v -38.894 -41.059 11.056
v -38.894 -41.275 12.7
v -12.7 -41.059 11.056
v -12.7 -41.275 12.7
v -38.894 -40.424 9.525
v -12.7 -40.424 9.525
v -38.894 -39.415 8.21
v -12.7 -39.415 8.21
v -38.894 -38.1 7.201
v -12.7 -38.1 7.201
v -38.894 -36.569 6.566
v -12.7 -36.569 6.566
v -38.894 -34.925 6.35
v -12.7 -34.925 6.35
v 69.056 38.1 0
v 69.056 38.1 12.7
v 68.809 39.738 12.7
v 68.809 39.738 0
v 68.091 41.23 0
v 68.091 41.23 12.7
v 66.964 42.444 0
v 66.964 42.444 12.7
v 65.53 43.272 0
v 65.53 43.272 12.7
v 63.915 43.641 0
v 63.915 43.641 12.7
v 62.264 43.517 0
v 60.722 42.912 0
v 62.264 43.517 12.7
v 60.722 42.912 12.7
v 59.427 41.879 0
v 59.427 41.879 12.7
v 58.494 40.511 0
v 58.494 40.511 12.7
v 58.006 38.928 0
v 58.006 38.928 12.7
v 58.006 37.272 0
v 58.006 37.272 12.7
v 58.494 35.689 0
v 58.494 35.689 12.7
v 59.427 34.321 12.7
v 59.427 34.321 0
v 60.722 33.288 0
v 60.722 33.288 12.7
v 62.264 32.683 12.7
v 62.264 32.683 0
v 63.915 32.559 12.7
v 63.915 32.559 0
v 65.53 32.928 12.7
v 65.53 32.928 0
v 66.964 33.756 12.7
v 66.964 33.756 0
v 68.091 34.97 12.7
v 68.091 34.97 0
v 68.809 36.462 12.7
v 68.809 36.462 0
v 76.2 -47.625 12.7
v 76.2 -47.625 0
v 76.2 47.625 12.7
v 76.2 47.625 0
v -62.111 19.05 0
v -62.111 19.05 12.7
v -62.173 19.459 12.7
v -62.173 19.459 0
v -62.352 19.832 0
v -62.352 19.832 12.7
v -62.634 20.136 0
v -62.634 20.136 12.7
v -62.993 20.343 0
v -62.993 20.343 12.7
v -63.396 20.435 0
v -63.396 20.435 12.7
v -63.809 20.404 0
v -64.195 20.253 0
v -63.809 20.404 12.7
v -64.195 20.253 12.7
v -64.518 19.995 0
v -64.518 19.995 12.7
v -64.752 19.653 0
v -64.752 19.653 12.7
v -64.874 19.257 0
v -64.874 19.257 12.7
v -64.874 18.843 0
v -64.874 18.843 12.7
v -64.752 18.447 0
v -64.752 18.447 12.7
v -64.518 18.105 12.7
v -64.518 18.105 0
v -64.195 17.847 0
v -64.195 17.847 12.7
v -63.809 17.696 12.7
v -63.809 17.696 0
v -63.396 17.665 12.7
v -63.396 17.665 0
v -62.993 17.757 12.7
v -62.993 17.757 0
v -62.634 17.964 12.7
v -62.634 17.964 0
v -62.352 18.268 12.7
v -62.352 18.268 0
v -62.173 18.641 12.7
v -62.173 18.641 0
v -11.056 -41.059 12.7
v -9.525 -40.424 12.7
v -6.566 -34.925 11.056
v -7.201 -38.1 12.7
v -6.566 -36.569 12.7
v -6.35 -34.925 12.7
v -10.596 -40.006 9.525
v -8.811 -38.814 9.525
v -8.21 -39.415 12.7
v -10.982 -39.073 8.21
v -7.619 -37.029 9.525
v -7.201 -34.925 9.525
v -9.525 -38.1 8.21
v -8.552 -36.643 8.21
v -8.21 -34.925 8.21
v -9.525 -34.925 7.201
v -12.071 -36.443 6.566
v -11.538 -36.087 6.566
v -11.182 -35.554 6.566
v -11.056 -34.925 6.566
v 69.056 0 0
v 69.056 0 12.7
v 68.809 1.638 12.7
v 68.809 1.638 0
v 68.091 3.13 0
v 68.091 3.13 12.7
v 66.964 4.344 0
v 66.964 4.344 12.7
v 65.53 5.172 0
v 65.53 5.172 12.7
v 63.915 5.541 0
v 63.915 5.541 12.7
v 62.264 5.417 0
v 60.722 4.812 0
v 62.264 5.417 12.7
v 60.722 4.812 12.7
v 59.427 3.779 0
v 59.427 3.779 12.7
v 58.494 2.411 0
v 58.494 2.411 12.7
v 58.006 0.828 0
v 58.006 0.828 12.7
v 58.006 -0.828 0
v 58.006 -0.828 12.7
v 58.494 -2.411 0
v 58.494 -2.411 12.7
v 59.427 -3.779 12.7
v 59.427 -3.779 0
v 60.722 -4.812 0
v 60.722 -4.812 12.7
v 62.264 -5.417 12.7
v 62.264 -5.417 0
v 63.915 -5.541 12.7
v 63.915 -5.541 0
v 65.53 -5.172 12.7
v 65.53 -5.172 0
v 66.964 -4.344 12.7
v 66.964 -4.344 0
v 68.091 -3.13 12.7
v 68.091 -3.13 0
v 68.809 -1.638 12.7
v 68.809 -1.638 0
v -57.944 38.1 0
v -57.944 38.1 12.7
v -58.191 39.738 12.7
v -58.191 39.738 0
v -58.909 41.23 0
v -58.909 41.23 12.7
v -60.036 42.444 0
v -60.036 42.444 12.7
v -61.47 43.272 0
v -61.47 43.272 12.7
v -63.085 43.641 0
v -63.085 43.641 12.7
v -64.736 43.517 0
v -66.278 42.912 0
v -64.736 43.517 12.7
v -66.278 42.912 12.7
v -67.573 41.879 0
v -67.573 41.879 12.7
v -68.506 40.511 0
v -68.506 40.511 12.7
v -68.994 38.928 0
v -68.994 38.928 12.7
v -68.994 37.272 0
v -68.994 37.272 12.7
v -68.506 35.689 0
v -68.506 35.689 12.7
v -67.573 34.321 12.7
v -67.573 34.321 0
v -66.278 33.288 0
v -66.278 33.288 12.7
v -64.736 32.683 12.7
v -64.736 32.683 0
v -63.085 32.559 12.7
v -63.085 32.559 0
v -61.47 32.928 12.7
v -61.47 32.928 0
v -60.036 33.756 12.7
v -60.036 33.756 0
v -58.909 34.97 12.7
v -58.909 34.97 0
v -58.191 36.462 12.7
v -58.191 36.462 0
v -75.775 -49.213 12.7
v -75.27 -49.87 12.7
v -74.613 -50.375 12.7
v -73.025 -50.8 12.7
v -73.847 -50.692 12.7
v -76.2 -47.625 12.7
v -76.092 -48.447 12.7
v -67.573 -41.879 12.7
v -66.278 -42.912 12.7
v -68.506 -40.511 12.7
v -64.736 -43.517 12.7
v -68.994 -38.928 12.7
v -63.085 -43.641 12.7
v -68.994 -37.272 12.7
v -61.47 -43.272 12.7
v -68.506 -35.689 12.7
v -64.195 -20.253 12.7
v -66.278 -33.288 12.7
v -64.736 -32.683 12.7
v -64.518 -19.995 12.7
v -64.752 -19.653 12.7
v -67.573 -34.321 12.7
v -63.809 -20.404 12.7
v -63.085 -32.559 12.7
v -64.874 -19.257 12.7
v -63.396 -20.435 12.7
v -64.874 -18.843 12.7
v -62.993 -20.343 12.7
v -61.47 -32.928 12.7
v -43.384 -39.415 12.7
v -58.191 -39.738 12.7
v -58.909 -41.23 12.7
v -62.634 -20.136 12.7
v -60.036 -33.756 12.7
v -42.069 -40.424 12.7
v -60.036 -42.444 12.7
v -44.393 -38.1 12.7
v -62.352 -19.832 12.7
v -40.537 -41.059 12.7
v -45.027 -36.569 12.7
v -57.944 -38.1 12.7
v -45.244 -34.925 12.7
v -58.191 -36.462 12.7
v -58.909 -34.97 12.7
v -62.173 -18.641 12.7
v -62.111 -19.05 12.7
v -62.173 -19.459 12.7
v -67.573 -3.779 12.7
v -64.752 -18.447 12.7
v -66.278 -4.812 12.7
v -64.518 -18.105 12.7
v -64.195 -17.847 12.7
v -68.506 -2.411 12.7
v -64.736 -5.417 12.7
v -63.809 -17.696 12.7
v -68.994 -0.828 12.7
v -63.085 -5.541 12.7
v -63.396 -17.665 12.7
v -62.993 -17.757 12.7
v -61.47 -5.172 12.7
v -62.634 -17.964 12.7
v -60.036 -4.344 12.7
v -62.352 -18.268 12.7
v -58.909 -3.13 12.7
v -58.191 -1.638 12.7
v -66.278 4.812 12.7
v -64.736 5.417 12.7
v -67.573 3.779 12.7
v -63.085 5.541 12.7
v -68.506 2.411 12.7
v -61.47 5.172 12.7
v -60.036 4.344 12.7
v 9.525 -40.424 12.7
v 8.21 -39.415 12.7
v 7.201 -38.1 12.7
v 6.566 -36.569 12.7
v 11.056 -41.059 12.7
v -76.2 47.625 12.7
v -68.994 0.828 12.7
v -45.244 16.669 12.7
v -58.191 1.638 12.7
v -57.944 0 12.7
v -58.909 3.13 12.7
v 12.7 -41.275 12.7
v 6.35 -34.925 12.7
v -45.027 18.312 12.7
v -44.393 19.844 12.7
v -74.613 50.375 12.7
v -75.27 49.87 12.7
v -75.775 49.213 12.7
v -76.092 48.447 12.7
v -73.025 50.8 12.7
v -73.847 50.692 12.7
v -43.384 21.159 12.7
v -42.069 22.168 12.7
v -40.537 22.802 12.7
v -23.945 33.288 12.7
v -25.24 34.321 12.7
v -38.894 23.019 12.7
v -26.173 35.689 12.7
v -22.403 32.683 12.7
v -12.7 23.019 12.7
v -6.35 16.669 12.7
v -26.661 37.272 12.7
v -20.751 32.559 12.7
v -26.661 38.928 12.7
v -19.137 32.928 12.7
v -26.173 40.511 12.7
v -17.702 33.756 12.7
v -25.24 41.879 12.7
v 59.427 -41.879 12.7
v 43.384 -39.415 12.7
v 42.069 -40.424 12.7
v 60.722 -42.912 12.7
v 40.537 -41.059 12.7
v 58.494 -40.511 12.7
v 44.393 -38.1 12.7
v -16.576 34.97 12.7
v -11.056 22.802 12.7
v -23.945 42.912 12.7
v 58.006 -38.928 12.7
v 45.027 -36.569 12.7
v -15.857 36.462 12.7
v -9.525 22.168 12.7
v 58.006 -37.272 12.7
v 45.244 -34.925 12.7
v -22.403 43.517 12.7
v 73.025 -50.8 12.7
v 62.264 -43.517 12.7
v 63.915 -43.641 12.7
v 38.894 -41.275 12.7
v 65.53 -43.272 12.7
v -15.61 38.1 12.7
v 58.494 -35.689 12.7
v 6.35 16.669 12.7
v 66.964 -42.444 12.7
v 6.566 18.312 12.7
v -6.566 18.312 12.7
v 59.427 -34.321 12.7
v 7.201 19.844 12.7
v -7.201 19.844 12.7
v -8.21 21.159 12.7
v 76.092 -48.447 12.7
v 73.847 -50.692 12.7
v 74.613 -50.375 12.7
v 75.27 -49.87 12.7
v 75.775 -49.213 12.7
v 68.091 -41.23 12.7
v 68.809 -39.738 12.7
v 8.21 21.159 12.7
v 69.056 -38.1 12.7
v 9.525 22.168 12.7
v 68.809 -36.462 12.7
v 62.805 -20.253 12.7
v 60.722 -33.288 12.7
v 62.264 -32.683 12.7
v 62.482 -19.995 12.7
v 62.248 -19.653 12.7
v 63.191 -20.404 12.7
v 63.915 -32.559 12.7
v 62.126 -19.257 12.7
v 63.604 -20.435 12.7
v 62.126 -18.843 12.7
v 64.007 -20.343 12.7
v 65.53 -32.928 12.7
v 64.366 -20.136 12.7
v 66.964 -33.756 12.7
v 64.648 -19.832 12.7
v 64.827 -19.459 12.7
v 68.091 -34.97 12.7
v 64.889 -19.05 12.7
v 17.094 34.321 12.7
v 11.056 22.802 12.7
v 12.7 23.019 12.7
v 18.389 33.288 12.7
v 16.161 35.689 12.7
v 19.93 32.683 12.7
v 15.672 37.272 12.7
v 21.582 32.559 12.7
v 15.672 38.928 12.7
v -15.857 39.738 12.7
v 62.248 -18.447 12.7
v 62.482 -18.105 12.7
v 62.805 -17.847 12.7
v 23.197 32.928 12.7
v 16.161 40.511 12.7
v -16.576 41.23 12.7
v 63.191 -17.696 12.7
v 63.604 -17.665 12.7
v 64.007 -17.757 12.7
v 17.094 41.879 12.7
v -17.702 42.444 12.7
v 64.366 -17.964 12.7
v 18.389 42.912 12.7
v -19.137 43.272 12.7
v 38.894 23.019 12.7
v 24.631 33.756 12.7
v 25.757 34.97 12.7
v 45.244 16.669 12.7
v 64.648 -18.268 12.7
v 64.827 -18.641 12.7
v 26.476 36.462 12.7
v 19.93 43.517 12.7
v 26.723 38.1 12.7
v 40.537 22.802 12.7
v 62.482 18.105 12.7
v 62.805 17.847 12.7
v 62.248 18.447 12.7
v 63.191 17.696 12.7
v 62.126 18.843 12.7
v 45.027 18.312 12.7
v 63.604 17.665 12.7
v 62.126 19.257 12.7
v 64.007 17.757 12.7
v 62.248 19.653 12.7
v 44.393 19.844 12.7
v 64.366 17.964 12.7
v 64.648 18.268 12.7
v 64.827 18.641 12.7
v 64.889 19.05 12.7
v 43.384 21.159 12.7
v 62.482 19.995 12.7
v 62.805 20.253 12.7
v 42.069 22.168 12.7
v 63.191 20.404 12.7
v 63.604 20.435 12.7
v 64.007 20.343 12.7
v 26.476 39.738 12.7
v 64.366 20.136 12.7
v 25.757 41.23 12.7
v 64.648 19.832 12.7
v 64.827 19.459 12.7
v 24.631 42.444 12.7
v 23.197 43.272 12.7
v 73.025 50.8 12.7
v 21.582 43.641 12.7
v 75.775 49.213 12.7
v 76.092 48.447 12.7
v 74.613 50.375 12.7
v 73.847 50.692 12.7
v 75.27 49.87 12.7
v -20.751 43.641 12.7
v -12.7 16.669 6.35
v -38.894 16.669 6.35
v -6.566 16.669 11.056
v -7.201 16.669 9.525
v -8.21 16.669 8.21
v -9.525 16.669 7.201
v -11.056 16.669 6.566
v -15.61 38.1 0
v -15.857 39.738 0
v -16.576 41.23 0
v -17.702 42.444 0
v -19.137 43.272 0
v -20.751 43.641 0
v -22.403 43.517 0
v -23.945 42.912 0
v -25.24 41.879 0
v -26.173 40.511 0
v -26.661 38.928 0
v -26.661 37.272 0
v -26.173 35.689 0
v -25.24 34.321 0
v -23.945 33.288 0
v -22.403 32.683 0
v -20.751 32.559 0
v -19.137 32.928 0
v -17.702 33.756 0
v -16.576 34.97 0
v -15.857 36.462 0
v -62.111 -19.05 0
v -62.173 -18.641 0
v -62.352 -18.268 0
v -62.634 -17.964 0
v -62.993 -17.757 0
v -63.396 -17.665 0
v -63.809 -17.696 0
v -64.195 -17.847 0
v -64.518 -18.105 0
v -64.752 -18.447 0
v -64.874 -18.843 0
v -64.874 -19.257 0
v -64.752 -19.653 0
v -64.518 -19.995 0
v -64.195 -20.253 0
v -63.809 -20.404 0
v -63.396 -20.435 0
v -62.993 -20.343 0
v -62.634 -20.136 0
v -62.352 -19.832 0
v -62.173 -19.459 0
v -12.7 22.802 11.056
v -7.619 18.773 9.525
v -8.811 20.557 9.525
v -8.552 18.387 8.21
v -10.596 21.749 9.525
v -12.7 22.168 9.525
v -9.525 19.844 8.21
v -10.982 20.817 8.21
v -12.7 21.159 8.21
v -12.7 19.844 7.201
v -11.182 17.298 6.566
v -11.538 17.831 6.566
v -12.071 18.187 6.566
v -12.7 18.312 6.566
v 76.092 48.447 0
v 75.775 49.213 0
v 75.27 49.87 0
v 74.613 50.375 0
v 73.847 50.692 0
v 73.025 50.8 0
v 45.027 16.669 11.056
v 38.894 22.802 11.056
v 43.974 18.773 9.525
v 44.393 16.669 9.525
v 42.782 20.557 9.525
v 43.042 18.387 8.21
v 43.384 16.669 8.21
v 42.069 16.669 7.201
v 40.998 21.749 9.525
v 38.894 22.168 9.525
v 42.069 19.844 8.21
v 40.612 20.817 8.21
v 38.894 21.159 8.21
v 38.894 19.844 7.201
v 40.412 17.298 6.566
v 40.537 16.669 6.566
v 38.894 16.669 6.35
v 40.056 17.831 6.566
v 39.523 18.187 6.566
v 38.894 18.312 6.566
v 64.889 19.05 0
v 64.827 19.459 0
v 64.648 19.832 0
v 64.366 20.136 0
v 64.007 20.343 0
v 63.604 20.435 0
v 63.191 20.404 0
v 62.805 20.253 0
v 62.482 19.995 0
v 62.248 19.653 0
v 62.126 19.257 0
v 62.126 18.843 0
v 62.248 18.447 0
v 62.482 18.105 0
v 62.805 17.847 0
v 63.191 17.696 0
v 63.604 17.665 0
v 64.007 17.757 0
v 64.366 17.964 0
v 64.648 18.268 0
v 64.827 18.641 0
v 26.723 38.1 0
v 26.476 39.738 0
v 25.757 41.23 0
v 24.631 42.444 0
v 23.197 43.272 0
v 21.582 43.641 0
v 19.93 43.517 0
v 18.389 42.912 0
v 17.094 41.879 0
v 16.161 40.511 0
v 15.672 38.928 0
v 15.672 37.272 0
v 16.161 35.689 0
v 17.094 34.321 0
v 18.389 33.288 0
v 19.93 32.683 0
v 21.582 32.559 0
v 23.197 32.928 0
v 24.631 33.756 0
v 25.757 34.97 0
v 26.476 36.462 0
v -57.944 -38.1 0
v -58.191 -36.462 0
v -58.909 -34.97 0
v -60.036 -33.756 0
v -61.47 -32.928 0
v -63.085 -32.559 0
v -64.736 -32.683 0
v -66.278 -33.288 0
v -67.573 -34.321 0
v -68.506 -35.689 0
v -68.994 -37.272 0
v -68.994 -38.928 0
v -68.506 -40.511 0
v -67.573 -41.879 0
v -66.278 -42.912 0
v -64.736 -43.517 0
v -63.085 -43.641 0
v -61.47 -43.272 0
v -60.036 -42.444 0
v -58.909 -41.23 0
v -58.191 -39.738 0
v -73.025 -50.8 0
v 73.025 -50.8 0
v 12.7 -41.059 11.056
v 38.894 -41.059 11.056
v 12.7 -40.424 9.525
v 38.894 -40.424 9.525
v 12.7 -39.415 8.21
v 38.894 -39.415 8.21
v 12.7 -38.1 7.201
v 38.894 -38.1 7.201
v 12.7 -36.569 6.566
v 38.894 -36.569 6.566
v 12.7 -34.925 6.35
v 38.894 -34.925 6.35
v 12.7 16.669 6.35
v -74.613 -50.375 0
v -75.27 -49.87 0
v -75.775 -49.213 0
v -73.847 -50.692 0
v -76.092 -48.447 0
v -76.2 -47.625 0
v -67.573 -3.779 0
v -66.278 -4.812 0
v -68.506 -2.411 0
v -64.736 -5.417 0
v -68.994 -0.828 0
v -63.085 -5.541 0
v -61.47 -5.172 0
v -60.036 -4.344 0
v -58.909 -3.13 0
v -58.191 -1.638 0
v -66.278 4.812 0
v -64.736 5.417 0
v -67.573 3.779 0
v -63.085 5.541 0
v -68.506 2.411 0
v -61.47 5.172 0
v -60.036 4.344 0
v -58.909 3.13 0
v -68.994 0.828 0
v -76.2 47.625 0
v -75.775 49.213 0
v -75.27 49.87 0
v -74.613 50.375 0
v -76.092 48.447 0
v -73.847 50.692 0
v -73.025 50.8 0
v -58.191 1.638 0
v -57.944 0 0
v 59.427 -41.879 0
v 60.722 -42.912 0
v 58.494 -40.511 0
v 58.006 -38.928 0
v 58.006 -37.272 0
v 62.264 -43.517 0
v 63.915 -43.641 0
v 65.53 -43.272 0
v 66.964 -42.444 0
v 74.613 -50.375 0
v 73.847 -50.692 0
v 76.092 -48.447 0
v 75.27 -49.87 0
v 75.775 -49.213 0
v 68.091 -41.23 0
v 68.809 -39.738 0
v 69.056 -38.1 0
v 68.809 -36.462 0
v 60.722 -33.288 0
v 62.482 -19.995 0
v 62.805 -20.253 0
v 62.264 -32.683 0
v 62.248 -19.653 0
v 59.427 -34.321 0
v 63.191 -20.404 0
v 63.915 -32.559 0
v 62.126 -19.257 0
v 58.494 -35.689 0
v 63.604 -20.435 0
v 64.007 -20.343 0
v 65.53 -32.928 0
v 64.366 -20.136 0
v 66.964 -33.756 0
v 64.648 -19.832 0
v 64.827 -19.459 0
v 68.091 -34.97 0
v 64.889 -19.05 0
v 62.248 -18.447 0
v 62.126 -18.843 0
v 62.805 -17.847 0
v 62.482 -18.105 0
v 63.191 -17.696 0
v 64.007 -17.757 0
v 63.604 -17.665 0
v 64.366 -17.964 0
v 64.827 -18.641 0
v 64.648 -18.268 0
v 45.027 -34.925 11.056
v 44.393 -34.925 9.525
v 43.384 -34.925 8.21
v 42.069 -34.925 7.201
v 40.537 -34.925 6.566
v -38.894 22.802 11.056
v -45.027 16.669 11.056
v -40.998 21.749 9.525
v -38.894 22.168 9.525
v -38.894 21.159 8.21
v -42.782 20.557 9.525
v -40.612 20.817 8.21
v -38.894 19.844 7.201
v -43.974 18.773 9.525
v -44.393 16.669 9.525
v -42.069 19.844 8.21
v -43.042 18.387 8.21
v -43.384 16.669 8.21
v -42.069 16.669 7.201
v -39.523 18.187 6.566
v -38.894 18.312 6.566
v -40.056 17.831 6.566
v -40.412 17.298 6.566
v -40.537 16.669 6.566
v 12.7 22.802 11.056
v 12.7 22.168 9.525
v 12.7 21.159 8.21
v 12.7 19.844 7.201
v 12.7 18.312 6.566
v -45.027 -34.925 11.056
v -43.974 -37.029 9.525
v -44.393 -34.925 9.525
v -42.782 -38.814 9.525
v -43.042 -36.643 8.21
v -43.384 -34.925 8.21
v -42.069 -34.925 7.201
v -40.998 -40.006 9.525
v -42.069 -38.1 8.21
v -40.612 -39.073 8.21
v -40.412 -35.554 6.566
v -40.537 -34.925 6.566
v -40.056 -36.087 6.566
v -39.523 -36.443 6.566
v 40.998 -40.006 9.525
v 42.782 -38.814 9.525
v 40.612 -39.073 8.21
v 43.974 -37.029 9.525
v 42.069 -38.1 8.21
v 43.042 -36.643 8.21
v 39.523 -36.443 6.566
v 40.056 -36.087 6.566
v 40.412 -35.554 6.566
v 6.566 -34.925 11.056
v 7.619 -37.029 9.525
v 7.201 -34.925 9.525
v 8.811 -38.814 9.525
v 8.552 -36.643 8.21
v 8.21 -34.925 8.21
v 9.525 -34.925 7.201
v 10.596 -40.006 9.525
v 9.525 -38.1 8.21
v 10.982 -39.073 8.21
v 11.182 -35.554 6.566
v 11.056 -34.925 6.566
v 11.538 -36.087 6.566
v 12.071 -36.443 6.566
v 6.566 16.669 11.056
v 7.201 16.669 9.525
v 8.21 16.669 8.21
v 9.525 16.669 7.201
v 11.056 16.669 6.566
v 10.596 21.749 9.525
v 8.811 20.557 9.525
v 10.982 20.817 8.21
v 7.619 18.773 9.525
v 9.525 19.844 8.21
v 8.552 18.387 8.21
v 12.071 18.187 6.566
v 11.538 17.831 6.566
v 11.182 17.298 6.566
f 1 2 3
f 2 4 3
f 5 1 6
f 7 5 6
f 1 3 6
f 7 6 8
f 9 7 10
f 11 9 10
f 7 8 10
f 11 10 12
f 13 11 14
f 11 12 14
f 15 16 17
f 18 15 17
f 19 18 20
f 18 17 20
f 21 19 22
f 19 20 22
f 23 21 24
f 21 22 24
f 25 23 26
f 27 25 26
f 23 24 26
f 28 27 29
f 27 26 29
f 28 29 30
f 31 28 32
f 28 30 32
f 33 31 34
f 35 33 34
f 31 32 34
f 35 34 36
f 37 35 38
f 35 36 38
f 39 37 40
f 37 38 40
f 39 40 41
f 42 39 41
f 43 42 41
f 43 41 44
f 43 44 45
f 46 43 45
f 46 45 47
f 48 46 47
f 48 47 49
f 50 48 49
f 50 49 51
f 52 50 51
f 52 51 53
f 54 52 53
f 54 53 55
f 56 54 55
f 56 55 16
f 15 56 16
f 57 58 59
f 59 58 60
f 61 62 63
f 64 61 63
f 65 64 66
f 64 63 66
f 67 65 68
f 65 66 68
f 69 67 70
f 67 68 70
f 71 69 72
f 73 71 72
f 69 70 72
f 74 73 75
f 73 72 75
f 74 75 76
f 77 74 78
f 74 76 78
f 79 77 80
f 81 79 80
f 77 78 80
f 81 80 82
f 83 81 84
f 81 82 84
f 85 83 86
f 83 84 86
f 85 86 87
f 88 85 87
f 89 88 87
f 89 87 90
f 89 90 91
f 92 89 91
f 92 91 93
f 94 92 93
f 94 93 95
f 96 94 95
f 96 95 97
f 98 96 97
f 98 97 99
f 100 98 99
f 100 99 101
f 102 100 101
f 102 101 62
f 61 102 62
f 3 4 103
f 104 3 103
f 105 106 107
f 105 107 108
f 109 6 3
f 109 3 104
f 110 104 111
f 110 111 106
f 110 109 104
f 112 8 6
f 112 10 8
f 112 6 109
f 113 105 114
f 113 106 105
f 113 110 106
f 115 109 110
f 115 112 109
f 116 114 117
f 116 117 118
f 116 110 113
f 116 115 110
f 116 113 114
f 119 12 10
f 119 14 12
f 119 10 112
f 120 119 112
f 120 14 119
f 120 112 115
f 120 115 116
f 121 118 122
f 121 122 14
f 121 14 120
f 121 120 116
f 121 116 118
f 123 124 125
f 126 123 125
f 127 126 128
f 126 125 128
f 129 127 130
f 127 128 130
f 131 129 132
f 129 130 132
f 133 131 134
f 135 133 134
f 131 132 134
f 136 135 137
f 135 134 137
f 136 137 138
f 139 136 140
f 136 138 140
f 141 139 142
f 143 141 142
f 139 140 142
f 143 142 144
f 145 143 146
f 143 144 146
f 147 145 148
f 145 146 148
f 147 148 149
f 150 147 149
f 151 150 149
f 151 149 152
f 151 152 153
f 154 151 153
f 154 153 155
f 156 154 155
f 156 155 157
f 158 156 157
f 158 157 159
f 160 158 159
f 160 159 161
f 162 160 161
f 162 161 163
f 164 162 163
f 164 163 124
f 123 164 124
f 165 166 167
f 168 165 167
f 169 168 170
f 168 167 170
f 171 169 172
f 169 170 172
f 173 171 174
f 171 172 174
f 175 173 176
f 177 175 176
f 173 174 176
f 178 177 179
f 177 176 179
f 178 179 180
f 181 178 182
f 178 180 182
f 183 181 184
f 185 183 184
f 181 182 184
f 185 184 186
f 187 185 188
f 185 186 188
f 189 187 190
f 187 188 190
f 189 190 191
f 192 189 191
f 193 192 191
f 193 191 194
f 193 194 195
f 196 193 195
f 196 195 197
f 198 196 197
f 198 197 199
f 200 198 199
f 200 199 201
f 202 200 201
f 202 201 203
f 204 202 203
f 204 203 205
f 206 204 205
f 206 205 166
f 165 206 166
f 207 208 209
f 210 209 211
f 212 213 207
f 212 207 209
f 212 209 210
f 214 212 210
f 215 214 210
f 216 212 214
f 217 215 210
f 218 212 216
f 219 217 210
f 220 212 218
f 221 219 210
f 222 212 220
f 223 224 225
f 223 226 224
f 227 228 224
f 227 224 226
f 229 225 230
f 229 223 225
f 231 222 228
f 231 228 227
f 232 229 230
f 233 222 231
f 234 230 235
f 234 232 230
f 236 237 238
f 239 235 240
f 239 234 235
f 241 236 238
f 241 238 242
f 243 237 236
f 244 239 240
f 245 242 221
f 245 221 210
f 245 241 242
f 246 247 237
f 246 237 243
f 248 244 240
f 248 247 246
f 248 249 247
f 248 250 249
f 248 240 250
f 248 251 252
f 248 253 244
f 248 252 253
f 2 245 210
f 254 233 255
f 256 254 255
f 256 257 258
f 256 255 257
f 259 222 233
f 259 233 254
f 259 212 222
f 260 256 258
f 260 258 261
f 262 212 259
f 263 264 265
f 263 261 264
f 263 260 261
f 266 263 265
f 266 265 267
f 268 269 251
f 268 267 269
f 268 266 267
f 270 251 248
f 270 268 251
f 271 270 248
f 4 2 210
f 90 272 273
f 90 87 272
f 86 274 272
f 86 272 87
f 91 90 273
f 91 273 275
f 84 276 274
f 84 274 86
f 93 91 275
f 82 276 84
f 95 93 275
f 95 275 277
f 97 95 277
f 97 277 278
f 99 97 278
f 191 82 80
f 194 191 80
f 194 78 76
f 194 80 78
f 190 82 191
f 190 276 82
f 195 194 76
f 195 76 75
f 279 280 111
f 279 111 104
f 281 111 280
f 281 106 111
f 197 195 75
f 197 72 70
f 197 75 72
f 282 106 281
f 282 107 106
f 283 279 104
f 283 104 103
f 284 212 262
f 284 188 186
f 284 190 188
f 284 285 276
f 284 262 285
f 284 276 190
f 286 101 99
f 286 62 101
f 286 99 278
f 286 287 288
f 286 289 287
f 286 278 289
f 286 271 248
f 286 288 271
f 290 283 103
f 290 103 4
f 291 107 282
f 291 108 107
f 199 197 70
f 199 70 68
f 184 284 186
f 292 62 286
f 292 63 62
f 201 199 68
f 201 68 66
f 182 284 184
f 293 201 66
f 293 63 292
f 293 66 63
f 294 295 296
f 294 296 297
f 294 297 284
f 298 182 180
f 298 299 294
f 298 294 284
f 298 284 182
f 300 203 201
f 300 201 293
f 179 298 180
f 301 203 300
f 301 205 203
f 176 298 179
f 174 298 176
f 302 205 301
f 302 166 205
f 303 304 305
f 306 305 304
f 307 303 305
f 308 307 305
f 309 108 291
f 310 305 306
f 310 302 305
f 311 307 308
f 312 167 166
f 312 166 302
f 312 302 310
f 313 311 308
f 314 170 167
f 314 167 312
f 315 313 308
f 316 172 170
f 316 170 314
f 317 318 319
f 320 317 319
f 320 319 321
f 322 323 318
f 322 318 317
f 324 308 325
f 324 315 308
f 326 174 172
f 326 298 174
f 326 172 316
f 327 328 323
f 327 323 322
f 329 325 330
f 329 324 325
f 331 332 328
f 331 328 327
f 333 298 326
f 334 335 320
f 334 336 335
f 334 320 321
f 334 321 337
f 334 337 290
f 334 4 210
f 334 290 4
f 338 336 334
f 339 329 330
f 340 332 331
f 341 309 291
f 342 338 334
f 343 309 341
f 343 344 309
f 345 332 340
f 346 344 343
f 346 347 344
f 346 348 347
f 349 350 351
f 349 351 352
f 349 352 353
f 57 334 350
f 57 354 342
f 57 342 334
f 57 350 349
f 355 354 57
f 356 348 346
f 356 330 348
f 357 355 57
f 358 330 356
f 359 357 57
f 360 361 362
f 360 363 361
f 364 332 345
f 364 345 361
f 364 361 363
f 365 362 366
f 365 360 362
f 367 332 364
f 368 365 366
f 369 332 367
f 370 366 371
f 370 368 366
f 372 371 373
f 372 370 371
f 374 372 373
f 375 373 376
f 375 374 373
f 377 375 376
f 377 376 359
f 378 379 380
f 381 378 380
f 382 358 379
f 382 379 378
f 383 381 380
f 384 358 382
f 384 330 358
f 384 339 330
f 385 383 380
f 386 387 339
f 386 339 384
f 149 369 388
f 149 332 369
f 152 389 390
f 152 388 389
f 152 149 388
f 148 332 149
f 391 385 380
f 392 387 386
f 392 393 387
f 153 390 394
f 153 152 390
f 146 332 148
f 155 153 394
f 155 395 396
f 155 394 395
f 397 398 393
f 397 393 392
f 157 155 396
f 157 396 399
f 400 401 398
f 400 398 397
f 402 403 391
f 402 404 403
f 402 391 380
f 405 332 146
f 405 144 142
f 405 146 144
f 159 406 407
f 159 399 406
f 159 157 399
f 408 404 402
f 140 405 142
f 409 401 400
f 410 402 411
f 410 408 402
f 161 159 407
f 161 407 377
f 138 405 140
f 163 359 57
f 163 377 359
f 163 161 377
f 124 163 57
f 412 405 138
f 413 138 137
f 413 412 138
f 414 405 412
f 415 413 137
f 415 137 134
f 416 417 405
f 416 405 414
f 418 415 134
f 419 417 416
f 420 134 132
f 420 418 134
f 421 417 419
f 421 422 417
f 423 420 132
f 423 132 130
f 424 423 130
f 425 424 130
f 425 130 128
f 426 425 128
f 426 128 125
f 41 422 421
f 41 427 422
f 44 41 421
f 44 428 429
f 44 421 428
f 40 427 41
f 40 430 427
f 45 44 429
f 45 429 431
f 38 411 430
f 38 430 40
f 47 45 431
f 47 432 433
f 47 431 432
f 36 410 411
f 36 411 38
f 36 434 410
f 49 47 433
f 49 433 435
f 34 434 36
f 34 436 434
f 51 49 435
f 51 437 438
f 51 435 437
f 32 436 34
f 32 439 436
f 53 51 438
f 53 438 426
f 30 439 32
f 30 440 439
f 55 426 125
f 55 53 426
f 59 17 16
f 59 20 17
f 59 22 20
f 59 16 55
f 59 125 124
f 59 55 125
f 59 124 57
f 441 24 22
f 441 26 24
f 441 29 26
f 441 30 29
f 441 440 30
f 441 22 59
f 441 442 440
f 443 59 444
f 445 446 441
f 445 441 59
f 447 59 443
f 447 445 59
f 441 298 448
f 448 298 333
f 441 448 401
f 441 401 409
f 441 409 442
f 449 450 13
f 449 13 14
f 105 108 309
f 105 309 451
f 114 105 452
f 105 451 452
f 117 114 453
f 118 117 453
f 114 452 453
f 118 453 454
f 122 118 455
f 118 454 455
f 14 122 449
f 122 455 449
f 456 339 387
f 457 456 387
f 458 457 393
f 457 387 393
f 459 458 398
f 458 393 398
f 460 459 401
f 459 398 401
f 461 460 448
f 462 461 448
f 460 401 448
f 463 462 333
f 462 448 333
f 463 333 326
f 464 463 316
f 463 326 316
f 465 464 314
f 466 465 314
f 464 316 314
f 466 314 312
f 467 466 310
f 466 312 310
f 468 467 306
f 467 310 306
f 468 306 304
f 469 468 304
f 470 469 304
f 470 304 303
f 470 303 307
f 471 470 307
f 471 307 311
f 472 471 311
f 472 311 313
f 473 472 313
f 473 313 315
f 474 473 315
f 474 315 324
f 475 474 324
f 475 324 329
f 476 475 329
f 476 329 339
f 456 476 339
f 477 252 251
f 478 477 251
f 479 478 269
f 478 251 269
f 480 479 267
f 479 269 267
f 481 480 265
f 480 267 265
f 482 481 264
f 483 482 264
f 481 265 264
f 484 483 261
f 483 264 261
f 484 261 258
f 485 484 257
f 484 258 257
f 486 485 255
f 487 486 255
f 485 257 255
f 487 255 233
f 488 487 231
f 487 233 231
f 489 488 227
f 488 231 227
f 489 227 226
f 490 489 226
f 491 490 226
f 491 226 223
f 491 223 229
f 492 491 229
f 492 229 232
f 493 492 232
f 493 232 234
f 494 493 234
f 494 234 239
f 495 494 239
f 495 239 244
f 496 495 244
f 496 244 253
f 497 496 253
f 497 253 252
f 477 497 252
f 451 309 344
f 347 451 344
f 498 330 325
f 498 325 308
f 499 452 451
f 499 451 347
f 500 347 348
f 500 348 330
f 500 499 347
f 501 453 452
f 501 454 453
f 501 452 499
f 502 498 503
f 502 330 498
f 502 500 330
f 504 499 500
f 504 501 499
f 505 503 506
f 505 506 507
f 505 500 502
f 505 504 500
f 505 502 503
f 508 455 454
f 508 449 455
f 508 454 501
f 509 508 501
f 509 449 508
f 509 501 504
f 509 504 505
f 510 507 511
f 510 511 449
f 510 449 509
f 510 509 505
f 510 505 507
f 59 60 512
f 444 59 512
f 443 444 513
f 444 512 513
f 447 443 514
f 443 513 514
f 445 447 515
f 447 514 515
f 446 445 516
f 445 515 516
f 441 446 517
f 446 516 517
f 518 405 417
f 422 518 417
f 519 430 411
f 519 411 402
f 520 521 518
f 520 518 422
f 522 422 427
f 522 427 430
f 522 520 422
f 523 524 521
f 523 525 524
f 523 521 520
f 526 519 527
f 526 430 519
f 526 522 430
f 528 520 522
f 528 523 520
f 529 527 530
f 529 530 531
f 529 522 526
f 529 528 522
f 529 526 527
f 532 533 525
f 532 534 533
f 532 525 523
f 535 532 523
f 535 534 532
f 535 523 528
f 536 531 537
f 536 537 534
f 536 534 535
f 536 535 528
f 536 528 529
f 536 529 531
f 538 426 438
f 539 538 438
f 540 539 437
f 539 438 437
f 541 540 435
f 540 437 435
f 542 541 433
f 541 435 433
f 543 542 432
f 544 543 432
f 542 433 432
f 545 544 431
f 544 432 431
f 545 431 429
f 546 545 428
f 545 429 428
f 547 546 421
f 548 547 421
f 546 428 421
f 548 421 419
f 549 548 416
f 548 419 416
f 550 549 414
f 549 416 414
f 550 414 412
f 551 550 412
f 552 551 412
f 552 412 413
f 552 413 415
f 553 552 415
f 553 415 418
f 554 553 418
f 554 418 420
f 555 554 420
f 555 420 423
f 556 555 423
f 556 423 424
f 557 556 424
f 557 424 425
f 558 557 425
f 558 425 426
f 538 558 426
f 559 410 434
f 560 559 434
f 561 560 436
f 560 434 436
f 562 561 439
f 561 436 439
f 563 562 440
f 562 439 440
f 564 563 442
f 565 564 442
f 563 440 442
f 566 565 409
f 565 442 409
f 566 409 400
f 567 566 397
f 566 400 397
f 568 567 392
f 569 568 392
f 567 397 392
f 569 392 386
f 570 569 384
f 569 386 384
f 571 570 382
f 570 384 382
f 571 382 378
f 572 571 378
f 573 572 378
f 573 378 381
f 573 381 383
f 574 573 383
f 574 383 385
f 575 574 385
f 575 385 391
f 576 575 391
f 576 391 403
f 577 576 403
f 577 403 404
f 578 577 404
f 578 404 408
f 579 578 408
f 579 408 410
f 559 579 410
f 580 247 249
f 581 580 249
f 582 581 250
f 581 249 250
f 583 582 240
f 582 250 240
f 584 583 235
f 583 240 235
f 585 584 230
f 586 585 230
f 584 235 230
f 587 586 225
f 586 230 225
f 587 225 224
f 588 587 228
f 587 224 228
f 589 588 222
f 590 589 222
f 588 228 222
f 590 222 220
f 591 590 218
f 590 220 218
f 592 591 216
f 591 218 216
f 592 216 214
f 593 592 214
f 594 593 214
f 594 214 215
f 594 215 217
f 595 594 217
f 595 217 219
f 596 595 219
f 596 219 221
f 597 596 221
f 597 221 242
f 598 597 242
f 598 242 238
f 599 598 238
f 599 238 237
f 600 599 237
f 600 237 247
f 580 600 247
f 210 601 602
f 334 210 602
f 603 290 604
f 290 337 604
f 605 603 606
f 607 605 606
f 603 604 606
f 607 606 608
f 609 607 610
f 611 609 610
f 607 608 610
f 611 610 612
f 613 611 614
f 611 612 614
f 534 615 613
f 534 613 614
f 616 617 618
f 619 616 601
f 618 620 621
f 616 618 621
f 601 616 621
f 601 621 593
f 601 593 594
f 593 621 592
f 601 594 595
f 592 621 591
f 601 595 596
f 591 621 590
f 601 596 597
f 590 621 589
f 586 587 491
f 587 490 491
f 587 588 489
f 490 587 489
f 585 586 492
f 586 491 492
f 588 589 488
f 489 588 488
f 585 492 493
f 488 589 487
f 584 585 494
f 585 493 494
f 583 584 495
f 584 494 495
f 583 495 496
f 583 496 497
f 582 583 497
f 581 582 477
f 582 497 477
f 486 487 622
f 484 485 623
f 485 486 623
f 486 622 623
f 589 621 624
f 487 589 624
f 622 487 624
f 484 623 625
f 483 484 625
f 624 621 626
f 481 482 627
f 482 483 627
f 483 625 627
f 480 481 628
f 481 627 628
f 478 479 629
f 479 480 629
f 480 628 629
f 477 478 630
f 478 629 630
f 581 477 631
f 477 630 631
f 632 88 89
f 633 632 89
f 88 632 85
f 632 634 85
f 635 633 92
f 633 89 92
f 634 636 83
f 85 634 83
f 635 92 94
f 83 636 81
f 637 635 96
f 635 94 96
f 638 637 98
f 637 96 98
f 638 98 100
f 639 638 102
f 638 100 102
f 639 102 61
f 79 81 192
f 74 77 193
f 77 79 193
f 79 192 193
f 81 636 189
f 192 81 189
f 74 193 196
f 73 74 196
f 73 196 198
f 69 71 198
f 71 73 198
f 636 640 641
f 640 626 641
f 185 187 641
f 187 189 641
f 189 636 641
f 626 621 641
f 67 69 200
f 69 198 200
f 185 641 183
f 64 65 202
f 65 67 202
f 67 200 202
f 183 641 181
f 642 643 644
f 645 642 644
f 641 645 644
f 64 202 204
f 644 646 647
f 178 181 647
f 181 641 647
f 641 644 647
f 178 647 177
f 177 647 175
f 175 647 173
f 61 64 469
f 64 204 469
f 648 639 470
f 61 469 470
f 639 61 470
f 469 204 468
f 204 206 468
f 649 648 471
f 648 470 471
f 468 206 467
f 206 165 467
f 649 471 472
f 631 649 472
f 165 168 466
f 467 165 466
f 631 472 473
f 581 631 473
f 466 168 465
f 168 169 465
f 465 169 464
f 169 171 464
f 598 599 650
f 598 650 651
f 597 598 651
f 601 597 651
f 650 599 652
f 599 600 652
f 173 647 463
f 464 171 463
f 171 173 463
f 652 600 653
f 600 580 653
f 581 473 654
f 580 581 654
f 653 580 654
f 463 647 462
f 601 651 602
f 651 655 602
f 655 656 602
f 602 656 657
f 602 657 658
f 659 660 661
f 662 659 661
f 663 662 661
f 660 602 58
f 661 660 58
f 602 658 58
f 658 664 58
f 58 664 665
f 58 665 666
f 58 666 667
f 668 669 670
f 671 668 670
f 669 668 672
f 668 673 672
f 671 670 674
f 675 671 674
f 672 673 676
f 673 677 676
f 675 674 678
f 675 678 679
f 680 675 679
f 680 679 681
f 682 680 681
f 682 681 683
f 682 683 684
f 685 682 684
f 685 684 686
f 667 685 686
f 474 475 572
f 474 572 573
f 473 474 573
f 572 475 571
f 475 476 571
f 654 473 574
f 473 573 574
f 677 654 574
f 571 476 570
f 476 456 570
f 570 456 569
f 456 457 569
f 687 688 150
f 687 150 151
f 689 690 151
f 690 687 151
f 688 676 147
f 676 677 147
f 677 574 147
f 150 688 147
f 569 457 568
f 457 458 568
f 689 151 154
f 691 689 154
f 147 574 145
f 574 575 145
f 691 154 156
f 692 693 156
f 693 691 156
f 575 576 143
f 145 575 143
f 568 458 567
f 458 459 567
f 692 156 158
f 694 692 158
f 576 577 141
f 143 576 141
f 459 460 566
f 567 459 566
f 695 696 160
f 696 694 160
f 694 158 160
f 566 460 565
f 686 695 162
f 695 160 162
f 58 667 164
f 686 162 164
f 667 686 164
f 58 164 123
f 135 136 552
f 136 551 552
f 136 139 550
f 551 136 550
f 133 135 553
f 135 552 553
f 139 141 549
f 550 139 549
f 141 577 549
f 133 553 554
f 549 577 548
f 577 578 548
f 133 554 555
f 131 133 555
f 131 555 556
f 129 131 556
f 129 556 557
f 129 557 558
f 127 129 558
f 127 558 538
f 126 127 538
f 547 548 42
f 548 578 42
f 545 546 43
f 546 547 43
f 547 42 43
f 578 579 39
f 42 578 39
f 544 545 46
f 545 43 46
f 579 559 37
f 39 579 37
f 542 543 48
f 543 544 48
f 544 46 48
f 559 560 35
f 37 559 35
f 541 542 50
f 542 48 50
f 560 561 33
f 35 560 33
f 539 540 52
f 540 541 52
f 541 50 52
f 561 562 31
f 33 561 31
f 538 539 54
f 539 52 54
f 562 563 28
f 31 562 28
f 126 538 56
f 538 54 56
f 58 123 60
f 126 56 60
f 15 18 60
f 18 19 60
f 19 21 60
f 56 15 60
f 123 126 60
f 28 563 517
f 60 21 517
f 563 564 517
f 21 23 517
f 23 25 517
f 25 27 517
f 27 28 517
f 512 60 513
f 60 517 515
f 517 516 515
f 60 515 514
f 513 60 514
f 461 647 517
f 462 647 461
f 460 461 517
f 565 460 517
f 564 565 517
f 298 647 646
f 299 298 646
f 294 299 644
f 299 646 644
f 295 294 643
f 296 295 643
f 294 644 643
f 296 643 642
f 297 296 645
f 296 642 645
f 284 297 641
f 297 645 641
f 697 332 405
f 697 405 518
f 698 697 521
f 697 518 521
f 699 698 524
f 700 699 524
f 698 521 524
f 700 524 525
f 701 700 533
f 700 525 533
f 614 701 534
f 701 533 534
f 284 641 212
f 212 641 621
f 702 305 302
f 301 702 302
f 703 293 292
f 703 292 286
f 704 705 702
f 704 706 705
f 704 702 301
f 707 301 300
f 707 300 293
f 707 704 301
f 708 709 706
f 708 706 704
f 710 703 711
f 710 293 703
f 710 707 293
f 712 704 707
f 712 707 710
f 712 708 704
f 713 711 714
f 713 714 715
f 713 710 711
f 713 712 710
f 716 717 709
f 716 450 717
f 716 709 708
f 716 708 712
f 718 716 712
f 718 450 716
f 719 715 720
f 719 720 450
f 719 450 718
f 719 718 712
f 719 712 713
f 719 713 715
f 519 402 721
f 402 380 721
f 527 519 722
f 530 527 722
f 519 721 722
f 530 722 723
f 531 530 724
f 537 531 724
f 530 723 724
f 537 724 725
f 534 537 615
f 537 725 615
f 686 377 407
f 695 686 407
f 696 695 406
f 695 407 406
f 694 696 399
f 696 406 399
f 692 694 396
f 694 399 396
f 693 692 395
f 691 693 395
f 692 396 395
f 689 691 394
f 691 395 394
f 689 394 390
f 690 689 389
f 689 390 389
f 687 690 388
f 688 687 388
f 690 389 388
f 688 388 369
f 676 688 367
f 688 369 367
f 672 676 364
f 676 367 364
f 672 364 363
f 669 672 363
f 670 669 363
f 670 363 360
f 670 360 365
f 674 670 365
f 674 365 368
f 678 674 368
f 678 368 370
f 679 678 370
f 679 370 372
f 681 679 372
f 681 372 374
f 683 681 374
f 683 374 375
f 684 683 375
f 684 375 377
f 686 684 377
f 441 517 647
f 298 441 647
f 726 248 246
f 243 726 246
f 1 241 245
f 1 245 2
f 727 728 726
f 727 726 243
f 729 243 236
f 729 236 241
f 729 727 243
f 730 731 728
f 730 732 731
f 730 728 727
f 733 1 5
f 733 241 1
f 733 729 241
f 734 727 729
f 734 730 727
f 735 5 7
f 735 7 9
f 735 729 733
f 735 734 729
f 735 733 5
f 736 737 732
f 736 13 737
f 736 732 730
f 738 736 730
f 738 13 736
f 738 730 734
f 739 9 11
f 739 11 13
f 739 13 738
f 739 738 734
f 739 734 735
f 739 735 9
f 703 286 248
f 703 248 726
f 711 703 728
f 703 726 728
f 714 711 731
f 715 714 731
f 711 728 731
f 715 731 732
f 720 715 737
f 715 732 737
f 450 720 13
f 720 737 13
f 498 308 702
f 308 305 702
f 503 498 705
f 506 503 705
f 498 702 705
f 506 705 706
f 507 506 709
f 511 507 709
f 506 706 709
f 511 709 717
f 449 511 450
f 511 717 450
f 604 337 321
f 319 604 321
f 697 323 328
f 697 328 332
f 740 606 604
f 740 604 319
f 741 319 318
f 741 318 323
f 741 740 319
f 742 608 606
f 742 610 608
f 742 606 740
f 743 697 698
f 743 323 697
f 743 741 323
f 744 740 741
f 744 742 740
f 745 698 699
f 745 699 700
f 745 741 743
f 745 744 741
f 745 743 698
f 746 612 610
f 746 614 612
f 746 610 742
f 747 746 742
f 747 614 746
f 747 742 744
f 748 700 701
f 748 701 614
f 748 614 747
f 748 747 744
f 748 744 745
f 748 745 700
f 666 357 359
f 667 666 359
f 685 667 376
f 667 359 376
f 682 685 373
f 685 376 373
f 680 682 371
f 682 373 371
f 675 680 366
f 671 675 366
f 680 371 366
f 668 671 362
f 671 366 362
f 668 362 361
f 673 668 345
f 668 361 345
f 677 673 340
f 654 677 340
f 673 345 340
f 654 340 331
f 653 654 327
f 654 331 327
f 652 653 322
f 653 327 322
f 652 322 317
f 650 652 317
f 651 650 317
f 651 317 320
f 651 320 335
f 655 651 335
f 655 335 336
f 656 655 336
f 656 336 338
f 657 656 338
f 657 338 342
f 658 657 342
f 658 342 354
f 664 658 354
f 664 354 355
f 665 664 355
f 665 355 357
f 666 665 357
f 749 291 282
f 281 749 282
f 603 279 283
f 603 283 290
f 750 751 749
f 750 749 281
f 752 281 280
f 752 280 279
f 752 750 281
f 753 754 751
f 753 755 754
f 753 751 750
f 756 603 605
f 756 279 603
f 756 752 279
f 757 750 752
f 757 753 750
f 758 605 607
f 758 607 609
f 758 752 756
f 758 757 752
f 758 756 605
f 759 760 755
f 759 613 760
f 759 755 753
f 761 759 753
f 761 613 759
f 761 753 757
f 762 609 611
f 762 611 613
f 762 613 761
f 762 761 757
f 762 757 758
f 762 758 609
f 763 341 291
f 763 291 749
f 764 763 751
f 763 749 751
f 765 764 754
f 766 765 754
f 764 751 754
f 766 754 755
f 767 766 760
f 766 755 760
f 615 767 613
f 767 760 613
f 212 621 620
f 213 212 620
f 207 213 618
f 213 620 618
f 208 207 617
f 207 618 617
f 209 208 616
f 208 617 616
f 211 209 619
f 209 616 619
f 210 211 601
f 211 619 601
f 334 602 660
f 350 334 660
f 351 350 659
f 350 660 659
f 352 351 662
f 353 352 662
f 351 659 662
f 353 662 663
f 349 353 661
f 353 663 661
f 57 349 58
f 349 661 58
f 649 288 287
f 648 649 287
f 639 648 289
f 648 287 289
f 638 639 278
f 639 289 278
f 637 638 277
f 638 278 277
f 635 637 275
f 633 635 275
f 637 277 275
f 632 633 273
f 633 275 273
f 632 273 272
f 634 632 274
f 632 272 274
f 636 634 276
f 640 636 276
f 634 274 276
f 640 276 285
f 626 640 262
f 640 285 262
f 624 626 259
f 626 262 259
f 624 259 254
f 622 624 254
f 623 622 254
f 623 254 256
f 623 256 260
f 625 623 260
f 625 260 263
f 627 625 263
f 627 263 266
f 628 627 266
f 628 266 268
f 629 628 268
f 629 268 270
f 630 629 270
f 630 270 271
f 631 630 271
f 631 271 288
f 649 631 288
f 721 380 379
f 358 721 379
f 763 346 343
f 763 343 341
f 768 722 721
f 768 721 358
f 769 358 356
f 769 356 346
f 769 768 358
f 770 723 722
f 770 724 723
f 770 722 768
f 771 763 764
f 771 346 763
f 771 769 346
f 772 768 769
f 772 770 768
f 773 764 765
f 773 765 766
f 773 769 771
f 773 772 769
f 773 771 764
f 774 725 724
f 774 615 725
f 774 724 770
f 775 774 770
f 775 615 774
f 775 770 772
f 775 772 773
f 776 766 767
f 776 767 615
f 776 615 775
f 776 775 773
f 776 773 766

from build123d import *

# Parameters (mm, degrees)
F1_DEPTH = 12.7
F3_R     = 5.55625
F4_DEPTH = 12.701
F2_R     = 1.3890625
F5_DEPTH = 12.701
F7_DEPTH = 6.35
F8_R     = 6.34999
F9_R     = 6.34999


# Not quite as in the source:
# - a fillet or chamfer is up to 0.001 mm smaller than in the source, because OpenCascade refuses the exact size


with BuildPart() as f1:
    # F0 (on Top) → F1 (new body)
    with BuildSketch(Plane.XY):
        with BuildLine():
            Line((-73.025, -50.8), (73.025, -50.8))
            ThreePointArc((73.025, -50.8), (75.2700640303, -49.8700640303), (76.2, -47.625))
            Line((76.2, -47.625), (76.2, 47.625))
            ThreePointArc((76.2, 47.625), (75.2700640303, 49.8700640303), (73.025, 50.8))
            Line((73.025, 50.8), (-73.025, 50.8))
            ThreePointArc((-73.025, 50.8), (-75.2700640303, 49.8700640303), (-76.2, 47.625))
            Line((-76.2, 47.625), (-76.2, -47.625))
            ThreePointArc((-76.2, -47.625), (-75.2700640303, -49.8700640303), (-73.025, -50.8))
        make_face()
    extrude(amount=F1_DEPTH)

    # F3 (on face) → F4 (cut, through all)
    with BuildSketch(Plane.XY.offset(12.7)):
        with Locations((-63.5, 38.1)):
            Circle(F3_R)
        with Locations((63.5, 38.1)):
            Circle(F3_R)
        with Locations((63.5, -38.1)):
            Circle(F3_R)
        with Locations((-63.5, -38.1)):
            Circle(F3_R)
        with Locations((-63.5, 0)):
            Circle(F3_R)
        with Locations((63.5, 0)):
            Circle(F3_R)
        with Locations((-21.1666666667, 38.1)):
            Circle(F3_R)
        with Locations((21.1666666667, 38.1)):
            Circle(F3_R)
    extrude(amount=-F4_DEPTH, mode=Mode.SUBTRACT)

    # F2 (on face) → F5 (cut, through all)
    with BuildSketch(Plane.XY.offset(12.7)):
        with Locations((-63.5, -19.05)):
            Circle(F2_R)
        with Locations((63.5, 19.05)):
            Circle(F2_R)
        with Locations((63.5, -19.05)):
            Circle(F2_R)
        with Locations((-63.5, 19.05)):
            Circle(F2_R)
    extrude(amount=-F5_DEPTH, mode=Mode.SUBTRACT)

    # F6 (on face) → F7 (cut)
    with BuildSketch(Plane.XY.offset(12.7)):
        with BuildLine():
            ThreePointArc((-6.35, 16.66875), (-8.2098719395, 21.1588780605), (-12.7, 23.01875))
            Line((-12.7, 23.01875), (-38.89375, 23.01875))
            ThreePointArc((-38.89375, 23.01875), (-43.3838780605, 21.1588780605), (-45.24375, 16.66875))
            Line((-45.24375, 16.66875), (-45.24375, -34.925))
            ThreePointArc((-45.24375, -34.925), (-43.3838780605, -39.4151280605), (-38.89375, -41.275))
            Line((-38.89375, -41.275), (-12.7, -41.275))
            ThreePointArc((-12.7, -41.275), (-8.2098719395, -39.4151280605), (-6.35, -34.925))
            Line((-6.35, -34.925), (-6.35, 16.66875))
        make_face()
        with BuildLine():
            ThreePointArc((6.35, -34.925), (8.2098719395, -39.4151280605), (12.7, -41.275))
            Line((12.7, -41.275), (38.89375, -41.275))
            ThreePointArc((38.89375, -41.275), (43.3838780605, -39.4151280605), (45.24375, -34.925))
            Line((45.24375, -34.925), (45.24375, 16.66875))
            ThreePointArc((45.24375, 16.66875), (43.3838780605, 21.1588780605), (38.89375, 23.01875))
            Line((38.89375, 23.01875), (12.7, 23.01875))
            ThreePointArc((12.7, 23.01875), (8.2098719395, 21.1588780605), (6.35, 16.66875))
            Line((6.35, 16.66875), (6.35, -34.925))
        make_face()
    extrude(amount=-F7_DEPTH, mode=Mode.SUBTRACT)

    # F8 (radius 6.35 in the source; OpenCascade refuses exactly that, so slightly less here)
    f8_edges = [f1.edges().sort_by_distance(p)[0] for p in [
        (-25.796875, -41.275, 6.35),
        (-6.35, -9.128125, 6.35),
        (-8.209872, -39.415128, 6.35),
        (-45.24375, -9.128125, 6.35),
        (-43.383878, -39.415128, 6.35),
        (-43.383878, 21.158878, 6.35),
        (-25.796875, 23.01875, 6.35),
        (-8.209872, 21.158878, 6.35),
    ]]
    fillet(f8_edges, radius=F8_R)

    # F9 (radius 6.35 in the source; OpenCascade refuses exactly that, so slightly less here)
    f9_edges = [f1.edges().sort_by_distance(p)[0] for p in [
        (6.35, -9.128125, 6.35),
        (8.209872, 21.158878, 6.35),
        (25.796875, 23.01875, 6.35),
        (43.383878, 21.158878, 6.35),
        (45.24375, -9.128125, 6.35),
        (43.383878, -39.415128, 6.35),
        (25.796875, -41.275, 6.35),
        (8.209872, -39.415128, 6.35),
    ]]
    fillet(f9_edges, radius=F9_R)


solid = f1.part
